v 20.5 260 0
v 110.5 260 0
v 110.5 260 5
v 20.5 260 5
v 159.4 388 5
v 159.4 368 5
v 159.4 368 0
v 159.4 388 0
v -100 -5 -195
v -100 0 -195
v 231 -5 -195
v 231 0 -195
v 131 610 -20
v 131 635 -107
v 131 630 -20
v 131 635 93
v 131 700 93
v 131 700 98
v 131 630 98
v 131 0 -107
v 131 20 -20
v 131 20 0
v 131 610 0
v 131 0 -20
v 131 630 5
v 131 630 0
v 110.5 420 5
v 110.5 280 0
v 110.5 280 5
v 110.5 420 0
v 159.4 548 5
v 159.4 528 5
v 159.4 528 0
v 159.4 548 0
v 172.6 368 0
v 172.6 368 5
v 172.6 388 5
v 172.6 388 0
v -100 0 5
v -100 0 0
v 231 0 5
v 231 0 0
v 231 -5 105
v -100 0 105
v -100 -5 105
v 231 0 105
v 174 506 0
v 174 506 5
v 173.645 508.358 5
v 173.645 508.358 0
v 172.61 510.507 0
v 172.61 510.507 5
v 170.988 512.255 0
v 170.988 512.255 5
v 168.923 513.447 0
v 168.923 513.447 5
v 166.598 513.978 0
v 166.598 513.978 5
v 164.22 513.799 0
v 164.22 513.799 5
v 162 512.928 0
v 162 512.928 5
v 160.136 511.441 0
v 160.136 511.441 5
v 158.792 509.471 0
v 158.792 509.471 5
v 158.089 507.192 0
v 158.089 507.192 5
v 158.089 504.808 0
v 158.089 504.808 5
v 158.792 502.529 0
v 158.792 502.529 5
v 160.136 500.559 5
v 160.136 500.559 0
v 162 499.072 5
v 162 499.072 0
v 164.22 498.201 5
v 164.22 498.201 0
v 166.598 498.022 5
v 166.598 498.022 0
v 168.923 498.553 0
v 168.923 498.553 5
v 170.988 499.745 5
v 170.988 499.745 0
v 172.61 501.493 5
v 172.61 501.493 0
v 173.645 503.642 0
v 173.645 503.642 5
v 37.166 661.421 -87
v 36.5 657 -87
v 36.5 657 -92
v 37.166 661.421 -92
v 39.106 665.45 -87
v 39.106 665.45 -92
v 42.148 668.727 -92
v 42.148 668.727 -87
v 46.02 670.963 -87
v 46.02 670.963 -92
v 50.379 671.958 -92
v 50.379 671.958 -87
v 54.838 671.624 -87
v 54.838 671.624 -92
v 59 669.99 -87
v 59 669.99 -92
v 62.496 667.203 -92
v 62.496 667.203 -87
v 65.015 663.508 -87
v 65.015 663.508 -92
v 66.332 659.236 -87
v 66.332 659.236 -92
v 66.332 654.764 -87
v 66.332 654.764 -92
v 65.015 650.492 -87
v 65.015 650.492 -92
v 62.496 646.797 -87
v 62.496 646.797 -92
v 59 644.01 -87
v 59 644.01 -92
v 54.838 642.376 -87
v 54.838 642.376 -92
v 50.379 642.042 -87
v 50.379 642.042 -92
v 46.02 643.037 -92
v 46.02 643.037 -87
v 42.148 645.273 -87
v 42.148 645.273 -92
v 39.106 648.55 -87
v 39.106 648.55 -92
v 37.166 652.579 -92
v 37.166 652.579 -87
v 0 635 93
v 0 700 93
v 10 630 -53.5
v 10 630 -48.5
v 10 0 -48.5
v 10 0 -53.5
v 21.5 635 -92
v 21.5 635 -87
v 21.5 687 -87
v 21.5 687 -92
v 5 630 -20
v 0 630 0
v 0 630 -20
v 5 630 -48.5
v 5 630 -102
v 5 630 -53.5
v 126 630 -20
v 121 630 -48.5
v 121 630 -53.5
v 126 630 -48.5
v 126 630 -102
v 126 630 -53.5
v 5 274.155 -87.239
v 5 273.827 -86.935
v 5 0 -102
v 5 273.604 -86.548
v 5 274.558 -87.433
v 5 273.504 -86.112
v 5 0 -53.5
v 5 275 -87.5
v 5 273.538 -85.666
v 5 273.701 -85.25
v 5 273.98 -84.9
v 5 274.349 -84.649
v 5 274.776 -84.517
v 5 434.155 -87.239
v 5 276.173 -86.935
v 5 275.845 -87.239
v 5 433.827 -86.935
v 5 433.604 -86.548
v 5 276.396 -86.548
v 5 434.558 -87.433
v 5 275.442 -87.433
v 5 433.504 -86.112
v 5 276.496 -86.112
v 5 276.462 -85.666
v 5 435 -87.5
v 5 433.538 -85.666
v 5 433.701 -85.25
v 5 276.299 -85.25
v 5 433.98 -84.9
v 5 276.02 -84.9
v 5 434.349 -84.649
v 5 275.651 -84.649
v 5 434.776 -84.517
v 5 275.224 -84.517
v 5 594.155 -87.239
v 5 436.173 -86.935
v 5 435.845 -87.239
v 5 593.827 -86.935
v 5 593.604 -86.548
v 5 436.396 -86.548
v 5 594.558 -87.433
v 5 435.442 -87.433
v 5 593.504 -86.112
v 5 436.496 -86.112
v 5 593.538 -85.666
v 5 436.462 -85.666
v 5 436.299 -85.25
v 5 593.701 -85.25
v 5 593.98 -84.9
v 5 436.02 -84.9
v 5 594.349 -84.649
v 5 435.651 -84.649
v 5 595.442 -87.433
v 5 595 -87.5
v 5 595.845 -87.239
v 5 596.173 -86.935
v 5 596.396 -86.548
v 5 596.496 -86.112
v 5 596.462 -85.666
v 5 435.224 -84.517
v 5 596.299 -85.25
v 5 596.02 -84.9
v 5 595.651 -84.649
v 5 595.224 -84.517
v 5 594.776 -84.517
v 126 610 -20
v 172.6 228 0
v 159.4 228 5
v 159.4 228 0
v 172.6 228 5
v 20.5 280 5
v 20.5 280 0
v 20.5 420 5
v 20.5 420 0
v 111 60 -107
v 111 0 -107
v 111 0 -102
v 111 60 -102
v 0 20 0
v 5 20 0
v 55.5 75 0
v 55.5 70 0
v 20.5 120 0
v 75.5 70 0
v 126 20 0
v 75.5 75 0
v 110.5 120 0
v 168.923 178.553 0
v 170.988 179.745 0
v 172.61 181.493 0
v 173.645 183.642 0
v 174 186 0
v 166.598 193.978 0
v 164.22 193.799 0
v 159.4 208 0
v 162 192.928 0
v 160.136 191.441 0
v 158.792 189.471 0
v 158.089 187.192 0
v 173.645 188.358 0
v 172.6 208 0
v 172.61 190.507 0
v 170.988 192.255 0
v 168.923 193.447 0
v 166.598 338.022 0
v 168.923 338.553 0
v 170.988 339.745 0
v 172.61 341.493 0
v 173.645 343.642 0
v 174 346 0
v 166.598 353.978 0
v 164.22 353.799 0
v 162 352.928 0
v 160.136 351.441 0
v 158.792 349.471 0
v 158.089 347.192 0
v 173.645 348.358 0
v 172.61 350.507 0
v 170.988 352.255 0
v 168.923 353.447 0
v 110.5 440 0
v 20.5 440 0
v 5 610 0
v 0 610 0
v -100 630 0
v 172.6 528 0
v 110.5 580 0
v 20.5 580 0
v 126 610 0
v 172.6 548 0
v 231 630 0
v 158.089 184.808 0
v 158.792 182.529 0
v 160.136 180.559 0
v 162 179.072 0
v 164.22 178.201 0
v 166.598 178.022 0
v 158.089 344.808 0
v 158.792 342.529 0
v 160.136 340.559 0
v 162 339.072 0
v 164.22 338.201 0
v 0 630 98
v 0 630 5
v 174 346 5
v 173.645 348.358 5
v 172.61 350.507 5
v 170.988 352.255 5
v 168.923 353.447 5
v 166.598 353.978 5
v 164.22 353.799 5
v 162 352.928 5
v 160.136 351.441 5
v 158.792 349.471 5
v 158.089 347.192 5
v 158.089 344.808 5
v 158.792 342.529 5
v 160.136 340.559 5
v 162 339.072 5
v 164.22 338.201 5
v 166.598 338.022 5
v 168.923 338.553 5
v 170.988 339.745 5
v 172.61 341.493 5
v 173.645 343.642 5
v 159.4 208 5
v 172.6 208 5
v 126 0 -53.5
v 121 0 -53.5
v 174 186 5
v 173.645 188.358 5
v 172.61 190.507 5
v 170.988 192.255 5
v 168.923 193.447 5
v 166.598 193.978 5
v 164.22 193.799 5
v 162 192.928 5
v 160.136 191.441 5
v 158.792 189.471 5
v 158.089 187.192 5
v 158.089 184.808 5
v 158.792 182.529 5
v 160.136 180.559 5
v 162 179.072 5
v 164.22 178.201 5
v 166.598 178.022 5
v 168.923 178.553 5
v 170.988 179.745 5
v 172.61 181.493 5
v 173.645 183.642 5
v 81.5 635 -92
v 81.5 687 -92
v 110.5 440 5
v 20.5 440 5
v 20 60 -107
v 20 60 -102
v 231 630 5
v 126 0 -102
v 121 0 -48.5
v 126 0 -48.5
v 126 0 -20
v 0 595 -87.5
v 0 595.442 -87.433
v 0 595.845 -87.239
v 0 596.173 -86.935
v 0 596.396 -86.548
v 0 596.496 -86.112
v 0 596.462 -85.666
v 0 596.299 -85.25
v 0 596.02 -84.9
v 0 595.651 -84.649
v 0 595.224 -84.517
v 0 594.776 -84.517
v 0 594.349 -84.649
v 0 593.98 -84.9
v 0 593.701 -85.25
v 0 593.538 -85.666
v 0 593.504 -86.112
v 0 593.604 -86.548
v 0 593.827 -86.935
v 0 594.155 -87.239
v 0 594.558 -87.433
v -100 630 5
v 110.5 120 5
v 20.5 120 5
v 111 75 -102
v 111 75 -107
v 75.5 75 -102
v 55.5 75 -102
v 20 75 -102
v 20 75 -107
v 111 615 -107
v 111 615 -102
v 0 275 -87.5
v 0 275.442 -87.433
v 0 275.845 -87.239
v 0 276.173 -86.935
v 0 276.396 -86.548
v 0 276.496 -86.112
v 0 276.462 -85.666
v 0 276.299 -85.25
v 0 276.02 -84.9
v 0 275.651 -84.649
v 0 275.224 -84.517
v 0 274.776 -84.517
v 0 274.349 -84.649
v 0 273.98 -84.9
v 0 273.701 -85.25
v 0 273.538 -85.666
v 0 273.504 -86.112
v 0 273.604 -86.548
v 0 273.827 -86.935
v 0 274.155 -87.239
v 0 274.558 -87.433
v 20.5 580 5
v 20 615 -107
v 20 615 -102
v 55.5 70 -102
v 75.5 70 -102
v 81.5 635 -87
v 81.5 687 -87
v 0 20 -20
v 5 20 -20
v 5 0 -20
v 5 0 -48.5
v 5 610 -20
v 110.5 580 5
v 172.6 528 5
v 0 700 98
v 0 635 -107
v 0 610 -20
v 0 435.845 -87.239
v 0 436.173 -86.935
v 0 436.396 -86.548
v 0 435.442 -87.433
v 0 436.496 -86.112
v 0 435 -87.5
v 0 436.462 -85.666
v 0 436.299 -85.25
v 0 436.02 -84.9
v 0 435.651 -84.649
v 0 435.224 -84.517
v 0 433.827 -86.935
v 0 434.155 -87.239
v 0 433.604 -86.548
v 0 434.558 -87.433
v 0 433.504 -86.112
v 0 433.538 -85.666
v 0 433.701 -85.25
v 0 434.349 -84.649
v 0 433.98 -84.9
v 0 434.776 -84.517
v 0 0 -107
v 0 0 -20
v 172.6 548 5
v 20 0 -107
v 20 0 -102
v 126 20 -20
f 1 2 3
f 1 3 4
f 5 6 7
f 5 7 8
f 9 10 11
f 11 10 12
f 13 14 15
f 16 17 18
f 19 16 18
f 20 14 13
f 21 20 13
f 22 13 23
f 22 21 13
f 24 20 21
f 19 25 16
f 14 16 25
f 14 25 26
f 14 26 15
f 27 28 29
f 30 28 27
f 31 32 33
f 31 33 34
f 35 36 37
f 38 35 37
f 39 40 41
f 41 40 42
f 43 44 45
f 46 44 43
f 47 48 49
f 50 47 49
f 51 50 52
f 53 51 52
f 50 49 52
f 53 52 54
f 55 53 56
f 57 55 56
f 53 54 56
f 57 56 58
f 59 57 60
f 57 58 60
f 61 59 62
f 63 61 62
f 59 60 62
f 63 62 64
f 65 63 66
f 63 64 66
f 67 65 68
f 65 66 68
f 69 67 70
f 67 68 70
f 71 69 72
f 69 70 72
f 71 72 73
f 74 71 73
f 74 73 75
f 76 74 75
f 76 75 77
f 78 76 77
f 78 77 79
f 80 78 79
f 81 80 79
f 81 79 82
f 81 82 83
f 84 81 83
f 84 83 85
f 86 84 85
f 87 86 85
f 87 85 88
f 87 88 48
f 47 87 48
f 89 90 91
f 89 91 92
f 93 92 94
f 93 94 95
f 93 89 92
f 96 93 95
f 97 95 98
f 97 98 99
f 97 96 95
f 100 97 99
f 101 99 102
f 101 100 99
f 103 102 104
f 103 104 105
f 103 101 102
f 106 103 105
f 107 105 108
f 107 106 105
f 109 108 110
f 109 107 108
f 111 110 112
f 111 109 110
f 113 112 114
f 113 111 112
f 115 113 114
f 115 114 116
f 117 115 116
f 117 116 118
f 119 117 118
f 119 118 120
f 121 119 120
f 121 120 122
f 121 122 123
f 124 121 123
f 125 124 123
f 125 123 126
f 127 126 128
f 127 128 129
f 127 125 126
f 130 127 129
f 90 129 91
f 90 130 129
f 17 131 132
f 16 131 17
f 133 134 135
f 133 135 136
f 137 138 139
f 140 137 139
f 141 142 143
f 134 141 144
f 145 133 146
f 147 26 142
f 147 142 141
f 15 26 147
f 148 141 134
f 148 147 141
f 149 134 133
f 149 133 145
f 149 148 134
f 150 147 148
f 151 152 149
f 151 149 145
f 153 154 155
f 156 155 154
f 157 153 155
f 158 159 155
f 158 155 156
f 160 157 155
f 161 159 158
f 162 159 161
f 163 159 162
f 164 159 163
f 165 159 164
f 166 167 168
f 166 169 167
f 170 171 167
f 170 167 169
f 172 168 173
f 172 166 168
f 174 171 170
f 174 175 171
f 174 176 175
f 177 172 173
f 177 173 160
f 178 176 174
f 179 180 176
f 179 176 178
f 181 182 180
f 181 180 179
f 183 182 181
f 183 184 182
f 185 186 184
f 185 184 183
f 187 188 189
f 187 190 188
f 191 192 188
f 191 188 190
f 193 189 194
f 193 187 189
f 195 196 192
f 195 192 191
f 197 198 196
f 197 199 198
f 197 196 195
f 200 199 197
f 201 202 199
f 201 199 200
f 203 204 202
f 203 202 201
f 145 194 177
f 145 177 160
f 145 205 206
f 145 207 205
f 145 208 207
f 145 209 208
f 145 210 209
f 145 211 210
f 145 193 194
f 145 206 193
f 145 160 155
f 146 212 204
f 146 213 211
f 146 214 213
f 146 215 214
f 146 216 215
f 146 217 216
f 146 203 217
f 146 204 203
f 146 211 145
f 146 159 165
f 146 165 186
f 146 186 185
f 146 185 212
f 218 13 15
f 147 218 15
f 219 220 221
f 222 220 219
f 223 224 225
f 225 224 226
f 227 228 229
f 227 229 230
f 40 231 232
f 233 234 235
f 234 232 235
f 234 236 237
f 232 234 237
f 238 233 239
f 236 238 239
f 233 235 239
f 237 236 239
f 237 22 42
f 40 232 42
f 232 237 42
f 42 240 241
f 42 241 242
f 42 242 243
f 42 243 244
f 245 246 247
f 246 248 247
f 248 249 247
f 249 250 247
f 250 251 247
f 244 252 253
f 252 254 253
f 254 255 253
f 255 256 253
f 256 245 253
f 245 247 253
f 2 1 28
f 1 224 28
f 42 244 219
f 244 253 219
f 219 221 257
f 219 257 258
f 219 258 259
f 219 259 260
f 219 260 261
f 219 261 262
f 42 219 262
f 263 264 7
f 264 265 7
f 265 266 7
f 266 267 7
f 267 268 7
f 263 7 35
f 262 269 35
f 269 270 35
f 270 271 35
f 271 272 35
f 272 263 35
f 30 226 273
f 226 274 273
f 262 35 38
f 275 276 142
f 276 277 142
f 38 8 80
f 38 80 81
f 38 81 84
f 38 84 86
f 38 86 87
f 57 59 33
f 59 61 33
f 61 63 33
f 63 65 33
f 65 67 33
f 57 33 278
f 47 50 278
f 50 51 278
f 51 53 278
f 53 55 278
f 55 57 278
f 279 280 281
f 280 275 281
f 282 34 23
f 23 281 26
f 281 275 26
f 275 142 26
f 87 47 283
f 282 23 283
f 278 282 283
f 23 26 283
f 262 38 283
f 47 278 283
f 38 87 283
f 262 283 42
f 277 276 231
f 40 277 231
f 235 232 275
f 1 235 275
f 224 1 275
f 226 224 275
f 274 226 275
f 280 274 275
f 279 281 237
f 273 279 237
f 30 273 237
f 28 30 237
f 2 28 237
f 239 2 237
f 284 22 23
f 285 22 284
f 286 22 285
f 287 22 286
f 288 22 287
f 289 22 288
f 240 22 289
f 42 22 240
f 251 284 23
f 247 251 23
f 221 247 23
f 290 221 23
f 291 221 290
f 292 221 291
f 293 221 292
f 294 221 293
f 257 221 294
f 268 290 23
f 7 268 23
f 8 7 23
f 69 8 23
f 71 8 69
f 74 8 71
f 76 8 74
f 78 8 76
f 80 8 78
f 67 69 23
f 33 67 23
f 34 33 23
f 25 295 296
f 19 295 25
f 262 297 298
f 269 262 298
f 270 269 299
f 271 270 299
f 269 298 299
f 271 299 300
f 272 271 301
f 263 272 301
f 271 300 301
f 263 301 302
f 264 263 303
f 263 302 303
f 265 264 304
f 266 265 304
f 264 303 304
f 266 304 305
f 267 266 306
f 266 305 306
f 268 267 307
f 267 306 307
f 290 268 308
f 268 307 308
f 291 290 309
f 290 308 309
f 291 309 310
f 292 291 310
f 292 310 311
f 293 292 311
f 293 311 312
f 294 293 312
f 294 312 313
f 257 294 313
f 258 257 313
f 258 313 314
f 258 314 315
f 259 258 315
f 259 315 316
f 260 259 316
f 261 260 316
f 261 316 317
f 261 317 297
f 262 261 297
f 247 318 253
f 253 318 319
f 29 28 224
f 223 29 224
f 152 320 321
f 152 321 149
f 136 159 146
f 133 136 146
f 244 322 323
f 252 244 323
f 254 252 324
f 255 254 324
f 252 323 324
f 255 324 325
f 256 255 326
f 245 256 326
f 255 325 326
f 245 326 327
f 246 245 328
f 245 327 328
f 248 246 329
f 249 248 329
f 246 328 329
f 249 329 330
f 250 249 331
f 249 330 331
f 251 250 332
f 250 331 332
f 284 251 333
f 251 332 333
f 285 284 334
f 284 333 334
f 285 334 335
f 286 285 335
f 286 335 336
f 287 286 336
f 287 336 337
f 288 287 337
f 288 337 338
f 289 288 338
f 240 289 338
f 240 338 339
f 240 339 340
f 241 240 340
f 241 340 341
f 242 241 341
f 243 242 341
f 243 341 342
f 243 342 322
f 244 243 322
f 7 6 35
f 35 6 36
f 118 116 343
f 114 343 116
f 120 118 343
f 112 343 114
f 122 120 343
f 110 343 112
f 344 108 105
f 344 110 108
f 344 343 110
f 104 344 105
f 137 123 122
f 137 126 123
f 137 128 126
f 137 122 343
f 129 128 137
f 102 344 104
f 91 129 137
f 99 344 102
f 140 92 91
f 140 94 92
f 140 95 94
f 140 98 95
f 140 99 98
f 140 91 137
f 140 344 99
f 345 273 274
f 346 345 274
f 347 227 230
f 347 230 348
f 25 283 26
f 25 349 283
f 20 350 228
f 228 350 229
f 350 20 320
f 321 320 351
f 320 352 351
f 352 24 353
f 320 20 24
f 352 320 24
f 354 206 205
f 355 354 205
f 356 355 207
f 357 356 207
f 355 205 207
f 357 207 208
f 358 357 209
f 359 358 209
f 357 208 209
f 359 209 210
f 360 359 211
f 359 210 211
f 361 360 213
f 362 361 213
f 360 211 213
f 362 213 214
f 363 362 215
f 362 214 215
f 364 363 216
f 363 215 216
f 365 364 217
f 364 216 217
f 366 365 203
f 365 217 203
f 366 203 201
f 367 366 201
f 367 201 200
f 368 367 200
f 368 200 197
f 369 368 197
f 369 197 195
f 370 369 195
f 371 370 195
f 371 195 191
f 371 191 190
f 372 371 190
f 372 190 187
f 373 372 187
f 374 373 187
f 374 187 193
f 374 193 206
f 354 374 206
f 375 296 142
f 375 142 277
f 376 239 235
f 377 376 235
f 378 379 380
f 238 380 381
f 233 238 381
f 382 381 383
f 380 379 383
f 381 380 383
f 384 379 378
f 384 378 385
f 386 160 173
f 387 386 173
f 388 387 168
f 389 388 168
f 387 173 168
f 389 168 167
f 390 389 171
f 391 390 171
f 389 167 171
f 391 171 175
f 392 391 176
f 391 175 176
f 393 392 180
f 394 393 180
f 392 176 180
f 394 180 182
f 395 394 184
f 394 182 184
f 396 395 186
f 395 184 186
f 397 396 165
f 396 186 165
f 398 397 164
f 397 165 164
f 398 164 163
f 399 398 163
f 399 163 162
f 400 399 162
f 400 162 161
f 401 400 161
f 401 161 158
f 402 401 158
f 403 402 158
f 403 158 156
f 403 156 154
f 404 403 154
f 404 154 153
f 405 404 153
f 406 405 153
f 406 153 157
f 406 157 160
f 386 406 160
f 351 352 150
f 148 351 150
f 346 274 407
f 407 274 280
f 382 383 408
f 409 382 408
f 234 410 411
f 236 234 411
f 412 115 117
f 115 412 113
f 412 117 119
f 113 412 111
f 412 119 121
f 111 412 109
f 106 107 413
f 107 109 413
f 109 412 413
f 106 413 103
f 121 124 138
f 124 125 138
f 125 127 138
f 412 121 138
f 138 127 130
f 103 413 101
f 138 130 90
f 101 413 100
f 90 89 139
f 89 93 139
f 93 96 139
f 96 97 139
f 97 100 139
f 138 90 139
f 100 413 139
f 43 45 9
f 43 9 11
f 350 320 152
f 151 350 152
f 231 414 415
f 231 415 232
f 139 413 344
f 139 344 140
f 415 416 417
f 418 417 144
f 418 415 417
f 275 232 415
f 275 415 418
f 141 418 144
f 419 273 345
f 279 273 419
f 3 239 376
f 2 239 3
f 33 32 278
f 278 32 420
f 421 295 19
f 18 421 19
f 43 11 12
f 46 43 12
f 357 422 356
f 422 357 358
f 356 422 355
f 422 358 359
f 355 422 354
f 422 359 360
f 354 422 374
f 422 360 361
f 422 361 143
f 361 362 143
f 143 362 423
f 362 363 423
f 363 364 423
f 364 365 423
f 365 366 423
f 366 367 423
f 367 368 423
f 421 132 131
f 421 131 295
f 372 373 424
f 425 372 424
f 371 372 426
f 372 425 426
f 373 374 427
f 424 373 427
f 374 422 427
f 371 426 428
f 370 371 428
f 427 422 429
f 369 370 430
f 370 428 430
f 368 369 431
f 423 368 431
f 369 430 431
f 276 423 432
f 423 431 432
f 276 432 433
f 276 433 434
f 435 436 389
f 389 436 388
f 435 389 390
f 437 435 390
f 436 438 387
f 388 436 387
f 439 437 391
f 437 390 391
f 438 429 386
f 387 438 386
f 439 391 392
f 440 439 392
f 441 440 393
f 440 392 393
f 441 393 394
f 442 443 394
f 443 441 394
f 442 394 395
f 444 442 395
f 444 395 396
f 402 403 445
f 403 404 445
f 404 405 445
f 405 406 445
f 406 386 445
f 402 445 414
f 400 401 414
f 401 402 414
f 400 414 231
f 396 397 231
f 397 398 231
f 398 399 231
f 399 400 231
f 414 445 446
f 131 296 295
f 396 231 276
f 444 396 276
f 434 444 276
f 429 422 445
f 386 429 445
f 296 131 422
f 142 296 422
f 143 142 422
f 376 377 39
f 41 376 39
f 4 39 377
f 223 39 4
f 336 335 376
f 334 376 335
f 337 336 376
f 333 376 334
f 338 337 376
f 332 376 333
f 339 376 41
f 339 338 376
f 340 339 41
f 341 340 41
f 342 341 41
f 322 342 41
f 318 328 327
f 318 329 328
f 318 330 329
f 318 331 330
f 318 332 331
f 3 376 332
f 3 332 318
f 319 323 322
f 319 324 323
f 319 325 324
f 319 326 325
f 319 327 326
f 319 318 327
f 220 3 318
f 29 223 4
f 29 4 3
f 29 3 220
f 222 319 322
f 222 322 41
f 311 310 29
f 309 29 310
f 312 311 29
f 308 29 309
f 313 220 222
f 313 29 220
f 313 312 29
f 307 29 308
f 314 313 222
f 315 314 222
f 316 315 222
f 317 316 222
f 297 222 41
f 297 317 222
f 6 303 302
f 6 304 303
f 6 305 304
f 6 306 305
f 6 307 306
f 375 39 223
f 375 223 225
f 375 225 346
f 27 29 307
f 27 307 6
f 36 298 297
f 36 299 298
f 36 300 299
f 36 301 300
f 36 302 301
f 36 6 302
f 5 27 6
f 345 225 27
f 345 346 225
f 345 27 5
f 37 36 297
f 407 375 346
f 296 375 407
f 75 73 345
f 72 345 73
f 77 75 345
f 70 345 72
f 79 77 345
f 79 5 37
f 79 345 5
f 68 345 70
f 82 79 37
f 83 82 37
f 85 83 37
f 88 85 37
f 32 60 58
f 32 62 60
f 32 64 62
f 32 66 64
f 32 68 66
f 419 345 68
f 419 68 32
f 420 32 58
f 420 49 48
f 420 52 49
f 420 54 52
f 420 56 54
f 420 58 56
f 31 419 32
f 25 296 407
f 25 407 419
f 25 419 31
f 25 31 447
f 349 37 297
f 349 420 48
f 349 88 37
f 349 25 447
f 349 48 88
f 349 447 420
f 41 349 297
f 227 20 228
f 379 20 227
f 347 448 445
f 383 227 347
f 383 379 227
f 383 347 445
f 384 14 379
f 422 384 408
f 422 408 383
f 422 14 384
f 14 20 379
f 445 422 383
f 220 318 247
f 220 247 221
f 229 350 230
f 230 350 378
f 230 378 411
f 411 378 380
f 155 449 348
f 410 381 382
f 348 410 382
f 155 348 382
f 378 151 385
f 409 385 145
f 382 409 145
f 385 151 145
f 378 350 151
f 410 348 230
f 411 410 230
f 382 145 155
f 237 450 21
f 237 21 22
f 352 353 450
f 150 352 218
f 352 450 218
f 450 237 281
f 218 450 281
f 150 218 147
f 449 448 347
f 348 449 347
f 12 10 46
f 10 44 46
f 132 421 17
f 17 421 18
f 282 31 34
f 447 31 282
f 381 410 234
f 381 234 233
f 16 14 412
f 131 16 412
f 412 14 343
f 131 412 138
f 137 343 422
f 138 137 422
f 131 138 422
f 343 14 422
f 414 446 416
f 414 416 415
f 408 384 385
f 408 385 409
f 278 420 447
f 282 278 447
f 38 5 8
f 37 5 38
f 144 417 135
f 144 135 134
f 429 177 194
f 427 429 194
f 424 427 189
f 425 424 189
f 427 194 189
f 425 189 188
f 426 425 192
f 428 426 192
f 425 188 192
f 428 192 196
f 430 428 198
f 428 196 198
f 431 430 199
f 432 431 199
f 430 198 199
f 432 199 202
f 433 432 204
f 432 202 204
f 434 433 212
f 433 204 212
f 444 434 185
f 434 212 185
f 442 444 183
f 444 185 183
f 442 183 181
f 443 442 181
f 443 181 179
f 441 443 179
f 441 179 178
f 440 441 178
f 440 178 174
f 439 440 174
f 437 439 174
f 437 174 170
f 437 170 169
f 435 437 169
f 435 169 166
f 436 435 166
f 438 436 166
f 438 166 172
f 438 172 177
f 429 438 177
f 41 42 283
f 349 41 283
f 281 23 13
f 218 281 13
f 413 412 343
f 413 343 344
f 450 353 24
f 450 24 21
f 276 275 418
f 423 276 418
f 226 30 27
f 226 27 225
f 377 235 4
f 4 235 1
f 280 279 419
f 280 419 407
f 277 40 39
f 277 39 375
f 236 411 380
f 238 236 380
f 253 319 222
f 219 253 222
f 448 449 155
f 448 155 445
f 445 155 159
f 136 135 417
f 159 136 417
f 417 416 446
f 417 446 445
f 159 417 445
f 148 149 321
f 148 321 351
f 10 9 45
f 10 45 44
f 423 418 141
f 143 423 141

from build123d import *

# Parameters (mm, degrees)
ESQUISSE1_W             = 102
ESQUISSE1_H             = 630
BOSS_EXTRU_1_DEPTH      = 131
ESQUISSE2_W             = 121
ESQUISSE2_H             = 630
ENL_V_MAT_EXTRU_1_DEPTH = 103
ESQUISSE3_W             = 5
ESQUISSE3_H             = 630
BOSS_EXTRU_2_DEPTH      = 5
ESQUISSE4_W             = 5
ESQUISSE4_H             = 630
BOSS_EXTRU_3_DEPTH      = 5
ESQUISSE5_W             = 331
ESQUISSE5_H             = 630
BOSS_EXTRU_4_DEPTH      = 5
ESQUISSE6_W             = 90
ESQUISSE6_H             = 140
ENL_V_MAT_EXTRU_2_DEPTH = 6
ESQUISSE7_R             = 8
ESQUISSE7_W             = 13.2
ESQUISSE7_H             = 20
ENL_V_MAT_EXTRU_3_DEPTH = 108
ESQUISSE8_W             = 20
ESQUISSE8_H             = 20
ENL_V_MAT_EXTRU_4_DEPTH = 232
ESQUISSE9_W             = 131
ESQUISSE9_H             = 630
BOSS_EXTRU_5_DEPTH      = 5
ESQUISSE10_W            = 91
ESQUISSE10_H            = 540
ENL_V_MAT_EXTRU_5_DEPTH = 5
ESQUISSE11_W            = 91
ESQUISSE11_H            = 60
ENL_V_MAT_EXTRU_6_DEPTH = 5
BOSS_EXTRU_6_REACH      = 109
ESQUISSE12_W            = 20
ESQUISSE12_H            = 5
ESQUISSE13_W            = 331
ESQUISSE13_H            = 5
BOSS_EXTRU_7_DEPTH      = 100
BOSS_EXTRU_7_DEPTH_BACK = 200
ESQUISSE15_W            = 131
ESQUISSE15_H            = 5
BOSS_EXTRU_8_DEPTH      = 200
ESQUISSE16_W            = 20
ESQUISSE16_H            = 20
ENL_V_MAT_EXTRU_7_DEPTH = 232
ESQUISSE18_R            = 1.5
ENL_V_MAT_EXTRU_8_DEPTH = 106
ESQUISSE21_W            = 60
ESQUISSE21_H            = 52
ESQUISSE21_R            = 15
BOSS_EXTRU_9_DEPTH      = 5
ESQUISSE22_W            = 131
ESQUISSE22_H            = 5
BOSS_EXTRU_10_DEPTH     = 70


with BuildPart() as part:
    # Esquisse1 → Boss.-Extru.1 (new body)
    with BuildSketch(Plane(origin=(0, 0, 0), x_dir=(0, 0, -1), z_dir=(1, 0, 0))):
        with Locations((51, 315)):
            Rectangle(ESQUISSE1_W, ESQUISSE1_H)
    extrude(amount=BOSS_EXTRU_1_DEPTH)

    # Esquisse2 → Enlèv. mat.-Extru.1 (cut, through all)
    with BuildSketch(Plane.XY):
        with Locations((65.5, 315)):
            Rectangle(ESQUISSE2_W, ESQUISSE2_H)
    extrude(amount=-ENL_V_MAT_EXTRU_1_DEPTH, mode=Mode.SUBTRACT)

    # Esquisse3 → Boss.-Extru.2 (add)
    with BuildSketch(Plane(origin=(5, 0, 0), x_dir=(0, 0, -1), z_dir=(1, 0, 0))):
        with Locations((51, 315)):
            Rectangle(ESQUISSE3_W, ESQUISSE3_H)
    extrude(amount=BOSS_EXTRU_2_DEPTH)

    # Esquisse4 → Boss.-Extru.3 (add)
    with BuildSketch(Plane.ZY.offset(-126)):
        with Locations((-51, 315)):
            Rectangle(ESQUISSE4_W, ESQUISSE4_H)
    extrude(amount=BOSS_EXTRU_3_DEPTH)

    # Esquisse5 → Boss.-Extru.4 (add)
    with BuildSketch(Plane.XY):
        with Locations((65.5, 315)):
            Rectangle(ESQUISSE5_W, ESQUISSE5_H)
    extrude(amount=BOSS_EXTRU_4_DEPTH)

    # Esquisse6 → Enlèv. mat.-Extru.2 (cut, through all)
    with BuildSketch(Plane(origin=(0, 0, 0), x_dir=(-1, 0, 0), z_dir=(0, 0, -1))):
        with Locations((-65.5, 190)):
            Rectangle(ESQUISSE6_W, ESQUISSE6_H)
        with Locations((-65.5, 350)):
            Rectangle(ESQUISSE6_W, ESQUISSE6_H)
        with Locations((-65.5, 510)):
            Rectangle(ESQUISSE6_W, ESQUISSE6_H)
    extrude(amount=-ENL_V_MAT_EXTRU_2_DEPTH, mode=Mode.SUBTRACT)

    # Esquisse7 → Enlèv. mat.-Extru.3 (cut, through all)
    with BuildSketch(Plane.XY.offset(5)):
        with Locations((166, 186)):
            Circle(ESQUISSE7_R)
        with Locations((166, 346)):
            Circle(ESQUISSE7_R)
        with Locations((166, 506)):
            Circle(ESQUISSE7_R)
        with Locations((166, 218)):
            Rectangle(ESQUISSE7_W, ESQUISSE7_H)
        with Locations((166, 378)):
            Rectangle(ESQUISSE7_W, ESQUISSE7_H)
        with Locations((166, 538)):
            Rectangle(ESQUISSE7_W, ESQUISSE7_H)
    extrude(amount=-ENL_V_MAT_EXTRU_3_DEPTH, mode=Mode.SUBTRACT)

    # Esquisse8 → Enlèv. mat.-Extru.4 (cut, through all)
    with BuildSketch(Plane.ZY):
        with Locations((-10, 10)):
            Rectangle(ESQUISSE8_W, ESQUISSE8_H)
    extrude(amount=-ENL_V_MAT_EXTRU_4_DEPTH, mode=Mode.SUBTRACT)

    # Esquisse9 → Boss.-Extru.5 (add)
    with BuildSketch(Plane(origin=(0, 0, -102), x_dir=(-1, 0, 0), z_dir=(0, 0, -1))):
        with Locations((-65.5, 315)):
            Rectangle(ESQUISSE9_W, ESQUISSE9_H)
    extrude(amount=BOSS_EXTRU_5_DEPTH)

    # Esquisse10 → Enlèv. mat.-Extru.5 (cut)
    with BuildSketch(Plane(origin=(0, 0, -107), x_dir=(-1, 0, 0), z_dir=(0, 0, -1))):
        with Locations((-65.5, 345)):
            Rectangle(ESQUISSE10_W, ESQUISSE10_H)
    extrude(amount=-ENL_V_MAT_EXTRU_5_DEPTH, mode=Mode.SUBTRACT)

    # Esquisse11 → Enlèv. mat.-Extru.6 (cut)
    with BuildSketch(Plane(origin=(0, 0, -107), x_dir=(-1, 0, 0), z_dir=(0, 0, -1))):
        with Locations((-65.5, 30)):
            Rectangle(ESQUISSE11_W, ESQUISSE11_H)
    extrude(amount=-ENL_V_MAT_EXTRU_6_DEPTH, mode=Mode.SUBTRACT)

    # Esquisse12 → Boss.-Extru.6 (add, up to next)
    with BuildSketch(Plane.XY.offset(-102), mode=Mode.PRIVATE) as boss_extru_6_sk1:
        with Locations((65.5, 72.5)):
            Rectangle(ESQUISSE12_W, ESQUISSE12_H)
    boss_extru_6_tool1 = extrude(boss_extru_6_sk1.sketch, amount=BOSS_EXTRU_6_REACH, mode=Mode.PRIVATE) - part.part
    add(boss_extru_6_tool1.solids().sort_by_distance((65.5, 72.5, -102))[0])

    # Esquisse15 → Boss.-Extru.8 (add)
    with BuildSketch(Plane(origin=(0, 0, -107), x_dir=(-1, 0, 0), z_dir=(0, 0, -1))):
        with Locations((-65.5, 632.5)):
            Rectangle(ESQUISSE15_W, ESQUISSE15_H)
    extrude(amount=-BOSS_EXTRU_8_DEPTH)

    # Esquisse16 → Enlèv. mat.-Extru.7 (cut, through all)
    with BuildSketch(Plane(origin=(131, 0, 0), x_dir=(0, 0, -1), z_dir=(1, 0, 0))):
        with Locations((10, 620)):
            Rectangle(ESQUISSE16_W, ESQUISSE16_H)
    extrude(amount=-ENL_V_MAT_EXTRU_7_DEPTH, mode=Mode.SUBTRACT)

    # Esquisse18 → Enlèv. mat.-Extru.8 (cut, through all)
    with BuildSketch(Plane(origin=(5, 0, 0), x_dir=(0, 0, -1), z_dir=(1, 0, 0))):
        with Locations((86, 595)):
            Circle(ESQUISSE18_R)
        with Locations((86, 435)):
            Circle(ESQUISSE18_R)
        with Locations((86, 275)):
            Circle(ESQUISSE18_R)
    extrude(amount=-ENL_V_MAT_EXTRU_8_DEPTH, mode=Mode.SUBTRACT)

    # Esquisse21 → Boss.-Extru.9 (add)
    with BuildSketch(Plane(origin=(0, 0, -87), x_dir=(-1, 0, 0), z_dir=(0, 0, -1))):
        with Locations((-51.5, 661)):
            Rectangle(ESQUISSE21_W, ESQUISSE21_H)
        with Locations((-51.5, 657)):
            Circle(ESQUISSE21_R, mode=Mode.SUBTRACT)
    extrude(amount=BOSS_EXTRU_9_DEPTH)

    # Esquisse22 → Boss.-Extru.10 (add)
    with BuildSketch(Plane.XZ.offset(-630)):
        with Locations((65.5, 95.5)):
            Rectangle(ESQUISSE22_W, ESQUISSE22_H)
    extrude(amount=-BOSS_EXTRU_10_DEPTH)


with BuildPart() as body_2:
    # Esquisse13 → Boss.-Extru.7 (new body, two sides)
    with BuildSketch(Plane.XY.offset(5)) as boss_extru_7_sk:
        with Locations((65.5, -2.5)):
            Rectangle(ESQUISSE13_W, ESQUISSE13_H)
    extrude(amount=BOSS_EXTRU_7_DEPTH)
    extrude(boss_extru_7_sk.sketch, amount=-BOSS_EXTRU_7_DEPTH_BACK)


solid = Compound([part.part, body_2.part])
